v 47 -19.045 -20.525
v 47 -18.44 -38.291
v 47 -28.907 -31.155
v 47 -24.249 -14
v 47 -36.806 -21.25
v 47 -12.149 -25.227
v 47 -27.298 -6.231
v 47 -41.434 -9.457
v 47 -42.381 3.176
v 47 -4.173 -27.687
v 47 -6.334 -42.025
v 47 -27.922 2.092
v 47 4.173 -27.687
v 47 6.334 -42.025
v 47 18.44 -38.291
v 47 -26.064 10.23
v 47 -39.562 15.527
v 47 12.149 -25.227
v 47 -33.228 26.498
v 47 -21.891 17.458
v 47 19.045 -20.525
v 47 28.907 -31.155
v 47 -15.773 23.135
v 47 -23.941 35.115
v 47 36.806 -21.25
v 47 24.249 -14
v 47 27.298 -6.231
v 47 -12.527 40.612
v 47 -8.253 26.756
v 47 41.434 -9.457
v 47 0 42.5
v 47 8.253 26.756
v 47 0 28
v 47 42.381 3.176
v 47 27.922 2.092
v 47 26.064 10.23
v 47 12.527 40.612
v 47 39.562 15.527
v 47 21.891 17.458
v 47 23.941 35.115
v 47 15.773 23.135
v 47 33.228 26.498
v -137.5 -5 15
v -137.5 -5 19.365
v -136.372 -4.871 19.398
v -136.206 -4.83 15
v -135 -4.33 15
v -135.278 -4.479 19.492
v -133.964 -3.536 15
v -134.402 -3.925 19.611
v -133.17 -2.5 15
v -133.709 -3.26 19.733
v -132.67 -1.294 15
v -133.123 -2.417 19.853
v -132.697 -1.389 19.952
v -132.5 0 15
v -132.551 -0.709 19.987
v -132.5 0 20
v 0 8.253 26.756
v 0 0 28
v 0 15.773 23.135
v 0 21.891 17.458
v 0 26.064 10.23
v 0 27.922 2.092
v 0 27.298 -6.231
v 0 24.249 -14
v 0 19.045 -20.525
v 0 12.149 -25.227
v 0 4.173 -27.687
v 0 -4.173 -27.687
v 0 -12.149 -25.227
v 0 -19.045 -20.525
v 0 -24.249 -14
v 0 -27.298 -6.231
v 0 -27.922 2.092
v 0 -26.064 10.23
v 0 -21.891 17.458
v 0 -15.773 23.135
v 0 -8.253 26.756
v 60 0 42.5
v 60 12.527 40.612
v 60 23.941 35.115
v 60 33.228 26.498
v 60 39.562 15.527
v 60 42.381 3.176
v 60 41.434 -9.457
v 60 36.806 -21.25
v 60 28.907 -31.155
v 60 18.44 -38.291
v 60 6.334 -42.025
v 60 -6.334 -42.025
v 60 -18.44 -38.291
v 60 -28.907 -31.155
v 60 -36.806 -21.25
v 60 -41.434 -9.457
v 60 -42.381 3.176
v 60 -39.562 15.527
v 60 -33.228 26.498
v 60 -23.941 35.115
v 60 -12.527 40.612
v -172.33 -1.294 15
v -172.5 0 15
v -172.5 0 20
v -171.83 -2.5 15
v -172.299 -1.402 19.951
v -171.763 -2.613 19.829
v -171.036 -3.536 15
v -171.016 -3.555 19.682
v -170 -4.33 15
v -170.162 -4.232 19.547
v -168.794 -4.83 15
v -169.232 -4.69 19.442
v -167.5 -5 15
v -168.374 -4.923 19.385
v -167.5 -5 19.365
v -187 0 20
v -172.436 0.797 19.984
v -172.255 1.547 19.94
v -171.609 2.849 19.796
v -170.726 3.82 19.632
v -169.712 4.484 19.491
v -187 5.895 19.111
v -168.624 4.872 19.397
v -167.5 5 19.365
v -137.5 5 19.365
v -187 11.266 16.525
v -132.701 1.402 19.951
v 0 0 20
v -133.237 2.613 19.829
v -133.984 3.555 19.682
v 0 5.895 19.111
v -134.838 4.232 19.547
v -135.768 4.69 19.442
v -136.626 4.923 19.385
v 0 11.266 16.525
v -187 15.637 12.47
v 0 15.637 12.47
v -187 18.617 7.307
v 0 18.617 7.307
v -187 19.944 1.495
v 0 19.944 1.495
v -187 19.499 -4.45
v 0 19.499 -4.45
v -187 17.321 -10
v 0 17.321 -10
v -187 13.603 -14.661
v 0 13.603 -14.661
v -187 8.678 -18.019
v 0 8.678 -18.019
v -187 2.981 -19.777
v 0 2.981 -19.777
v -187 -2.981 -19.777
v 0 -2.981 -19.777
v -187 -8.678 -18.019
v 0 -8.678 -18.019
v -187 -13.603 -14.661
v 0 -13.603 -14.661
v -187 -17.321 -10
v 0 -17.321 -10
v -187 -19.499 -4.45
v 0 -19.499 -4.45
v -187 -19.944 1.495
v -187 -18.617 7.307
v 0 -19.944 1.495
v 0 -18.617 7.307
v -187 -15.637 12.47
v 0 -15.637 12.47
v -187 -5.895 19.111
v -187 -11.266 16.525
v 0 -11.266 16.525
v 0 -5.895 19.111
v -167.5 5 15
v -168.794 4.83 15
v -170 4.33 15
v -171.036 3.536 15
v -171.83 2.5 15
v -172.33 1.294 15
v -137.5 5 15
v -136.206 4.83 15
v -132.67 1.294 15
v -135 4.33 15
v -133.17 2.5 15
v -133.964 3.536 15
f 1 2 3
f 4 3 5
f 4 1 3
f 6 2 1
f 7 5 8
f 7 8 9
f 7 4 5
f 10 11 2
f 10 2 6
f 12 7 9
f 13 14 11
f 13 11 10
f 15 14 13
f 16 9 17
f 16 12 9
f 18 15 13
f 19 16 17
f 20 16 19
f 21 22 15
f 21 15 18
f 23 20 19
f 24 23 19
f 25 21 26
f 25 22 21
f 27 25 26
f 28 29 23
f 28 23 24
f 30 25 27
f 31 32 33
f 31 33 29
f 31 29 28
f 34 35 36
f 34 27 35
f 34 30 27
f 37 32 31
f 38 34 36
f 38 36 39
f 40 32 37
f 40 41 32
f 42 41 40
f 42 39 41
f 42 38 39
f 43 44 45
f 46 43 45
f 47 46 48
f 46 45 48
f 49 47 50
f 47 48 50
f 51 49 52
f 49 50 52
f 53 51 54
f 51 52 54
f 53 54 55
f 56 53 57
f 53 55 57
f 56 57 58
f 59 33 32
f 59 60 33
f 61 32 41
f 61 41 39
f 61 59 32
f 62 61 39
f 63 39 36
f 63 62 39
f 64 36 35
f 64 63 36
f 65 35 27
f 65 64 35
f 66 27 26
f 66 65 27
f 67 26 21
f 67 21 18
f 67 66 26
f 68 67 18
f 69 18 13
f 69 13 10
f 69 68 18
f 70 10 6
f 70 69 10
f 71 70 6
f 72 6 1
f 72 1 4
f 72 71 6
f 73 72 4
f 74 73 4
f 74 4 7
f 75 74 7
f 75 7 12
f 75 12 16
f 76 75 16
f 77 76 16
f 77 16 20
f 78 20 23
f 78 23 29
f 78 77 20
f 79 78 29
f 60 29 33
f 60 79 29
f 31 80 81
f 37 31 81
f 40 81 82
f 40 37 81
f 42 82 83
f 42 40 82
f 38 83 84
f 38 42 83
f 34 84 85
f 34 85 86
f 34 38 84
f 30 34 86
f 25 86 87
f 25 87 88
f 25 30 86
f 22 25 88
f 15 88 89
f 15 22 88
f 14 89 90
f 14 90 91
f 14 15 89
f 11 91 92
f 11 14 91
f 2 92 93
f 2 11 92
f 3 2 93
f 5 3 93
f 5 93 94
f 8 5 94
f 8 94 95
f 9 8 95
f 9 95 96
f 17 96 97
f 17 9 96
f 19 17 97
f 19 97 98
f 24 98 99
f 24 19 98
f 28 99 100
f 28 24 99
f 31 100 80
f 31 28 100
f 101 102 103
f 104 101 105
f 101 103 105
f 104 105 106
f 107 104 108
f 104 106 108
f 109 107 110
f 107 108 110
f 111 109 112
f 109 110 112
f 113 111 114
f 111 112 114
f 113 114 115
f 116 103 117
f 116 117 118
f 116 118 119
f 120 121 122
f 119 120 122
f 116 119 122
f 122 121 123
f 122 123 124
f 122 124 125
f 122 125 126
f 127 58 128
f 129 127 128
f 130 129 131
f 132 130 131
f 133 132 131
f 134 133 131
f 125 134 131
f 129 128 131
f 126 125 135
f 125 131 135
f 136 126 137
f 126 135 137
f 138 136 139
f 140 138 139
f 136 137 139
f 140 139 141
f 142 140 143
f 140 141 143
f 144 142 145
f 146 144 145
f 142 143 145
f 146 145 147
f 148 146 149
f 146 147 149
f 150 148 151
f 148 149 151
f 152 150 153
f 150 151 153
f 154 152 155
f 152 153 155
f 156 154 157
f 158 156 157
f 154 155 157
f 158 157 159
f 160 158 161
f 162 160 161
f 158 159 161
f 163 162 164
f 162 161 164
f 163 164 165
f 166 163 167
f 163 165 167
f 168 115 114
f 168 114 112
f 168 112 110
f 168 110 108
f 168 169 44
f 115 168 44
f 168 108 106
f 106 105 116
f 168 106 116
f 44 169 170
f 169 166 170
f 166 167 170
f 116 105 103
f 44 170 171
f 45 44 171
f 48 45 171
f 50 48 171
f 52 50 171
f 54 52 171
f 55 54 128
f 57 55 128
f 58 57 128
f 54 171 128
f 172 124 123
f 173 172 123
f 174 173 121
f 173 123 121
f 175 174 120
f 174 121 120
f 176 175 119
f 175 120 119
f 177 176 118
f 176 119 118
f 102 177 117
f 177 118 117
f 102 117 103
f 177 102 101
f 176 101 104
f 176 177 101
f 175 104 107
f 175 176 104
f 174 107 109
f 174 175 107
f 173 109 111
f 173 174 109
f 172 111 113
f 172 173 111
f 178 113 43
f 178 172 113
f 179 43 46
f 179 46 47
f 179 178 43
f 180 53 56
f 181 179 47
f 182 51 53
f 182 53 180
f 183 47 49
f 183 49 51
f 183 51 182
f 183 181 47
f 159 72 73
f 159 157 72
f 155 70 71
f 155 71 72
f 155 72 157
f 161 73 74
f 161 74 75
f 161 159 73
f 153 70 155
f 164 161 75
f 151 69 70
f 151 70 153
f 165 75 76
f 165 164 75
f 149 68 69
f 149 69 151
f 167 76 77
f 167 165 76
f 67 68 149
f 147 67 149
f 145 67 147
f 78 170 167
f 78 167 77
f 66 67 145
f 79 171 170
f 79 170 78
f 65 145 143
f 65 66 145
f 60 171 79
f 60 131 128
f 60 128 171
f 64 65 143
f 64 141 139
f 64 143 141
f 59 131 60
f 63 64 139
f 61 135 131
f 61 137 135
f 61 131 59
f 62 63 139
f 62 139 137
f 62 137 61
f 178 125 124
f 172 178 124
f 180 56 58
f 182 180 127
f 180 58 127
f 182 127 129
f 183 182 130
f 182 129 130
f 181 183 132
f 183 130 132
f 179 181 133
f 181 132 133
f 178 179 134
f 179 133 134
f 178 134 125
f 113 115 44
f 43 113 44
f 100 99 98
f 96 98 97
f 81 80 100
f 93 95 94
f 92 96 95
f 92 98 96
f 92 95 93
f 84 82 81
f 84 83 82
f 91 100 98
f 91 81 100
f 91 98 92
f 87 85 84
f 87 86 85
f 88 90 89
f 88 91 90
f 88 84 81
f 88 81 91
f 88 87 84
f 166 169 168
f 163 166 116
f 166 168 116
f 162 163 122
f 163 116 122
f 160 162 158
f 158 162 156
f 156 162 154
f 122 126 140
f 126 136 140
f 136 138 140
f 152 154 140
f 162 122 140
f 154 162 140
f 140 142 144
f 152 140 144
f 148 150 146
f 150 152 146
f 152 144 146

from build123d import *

# Parameters (mm, degrees)
F0_W     = 187
F0_H     = 20
F3_DEPTH = 100
F4_DEPTH = 85


with BuildPart() as f1:
    # F0 (on Front) → F1 (revolve)
    with BuildSketch(Plane.XZ):
        Polygon((47, 28), (47, 0), (60, 0), (60, 42.5), (47, 42.5), align=None)
        with Locations((-93.5, 10)):
            Rectangle(F0_W, F0_H)
        Polygon((0, 20), (0, 0), (47, 0), (47, 28), (0, 28), align=None)
    revolve(axis=Axis((-82.005277276, 0, 0), (-1, 0, 0)))

    # F2 (on Top) → F3 (join)
    with BuildSketch(Plane.XY):
        with BuildLine():
            ThreePointArc((-167.5, 5), (-171.0355339059, 3.5355339059), (-172.5, 0))
            Line((-172.5, 0), (-167.5, 0))
            Line((-167.5, 0), (-162.5, 0))
            ThreePointArc((-162.5, 0), (-163.9644660941, 3.5355339059), (-167.5, 5))
        make_face()
        with BuildLine():
            Line((-167.5, 0), (-172.5, 0))
            ThreePointArc((-172.5, 0), (-171.0355339059, -3.5355339059), (-167.5, -5))
            ThreePointArc((-167.5, -5), (-163.9644660941, -3.5355339059), (-162.5, 0))
            Line((-162.5, 0), (-167.5, 0))
        make_face()
        with BuildLine():
            Line((-137.5, 5), (-167.5, 5))
            ThreePointArc((-167.5, 5), (-163.9644660941, 3.5355339059), (-162.5, 0))
            Line((-162.5, 0), (-142.5, 0))
            ThreePointArc((-142.5, 0), (-141.0355339059, 3.5355339059), (-137.5, 5))
        make_face()
        with BuildLine():
            ThreePointArc((-162.5, 0), (-163.9644660941, -3.5355339059), (-167.5, -5))
            Line((-167.5, -5), (-137.5, -5))
            ThreePointArc((-137.5, -5), (-141.0355339059, -3.5355339059), (-142.5, 0))
            Line((-142.5, 0), (-162.5, 0))
        make_face()
        with BuildLine():
            Line((-137.5, 0), (-137.5, 5))
            ThreePointArc((-137.5, 5), (-141.0355339059, 3.5355339059), (-142.5, 0))
            Line((-142.5, 0), (-137.5, 0))
        make_face()
        with BuildLine():
            ThreePointArc((-132.5, 0), (-133.9644660941, 3.5355339059), (-137.5, 5))
            Line((-137.5, 5), (-137.5, 0))
            Line((-137.5, 0), (-137.5, -5))
            ThreePointArc((-137.5, -5), (-133.9644660941, -3.5355339059), (-132.5, 0))
        make_face()
        with BuildLine():
            ThreePointArc((-142.5, 0), (-141.0355339059, -3.5355339059), (-137.5, -5))
            Line((-137.5, -5), (-137.5, 0))
            Line((-137.5, 0), (-142.5, 0))
        make_face()
    extrude(amount=F3_DEPTH)

    # F4 (cut): a face of the model
    f4_faces = [f1.faces().sort_by_distance(p)[0] for p in [
        (-152.5, 0, 100),
    ]]
    extrude(f4_faces, amount=-F4_DEPTH, mode=Mode.SUBTRACT)


solid = f1.part
